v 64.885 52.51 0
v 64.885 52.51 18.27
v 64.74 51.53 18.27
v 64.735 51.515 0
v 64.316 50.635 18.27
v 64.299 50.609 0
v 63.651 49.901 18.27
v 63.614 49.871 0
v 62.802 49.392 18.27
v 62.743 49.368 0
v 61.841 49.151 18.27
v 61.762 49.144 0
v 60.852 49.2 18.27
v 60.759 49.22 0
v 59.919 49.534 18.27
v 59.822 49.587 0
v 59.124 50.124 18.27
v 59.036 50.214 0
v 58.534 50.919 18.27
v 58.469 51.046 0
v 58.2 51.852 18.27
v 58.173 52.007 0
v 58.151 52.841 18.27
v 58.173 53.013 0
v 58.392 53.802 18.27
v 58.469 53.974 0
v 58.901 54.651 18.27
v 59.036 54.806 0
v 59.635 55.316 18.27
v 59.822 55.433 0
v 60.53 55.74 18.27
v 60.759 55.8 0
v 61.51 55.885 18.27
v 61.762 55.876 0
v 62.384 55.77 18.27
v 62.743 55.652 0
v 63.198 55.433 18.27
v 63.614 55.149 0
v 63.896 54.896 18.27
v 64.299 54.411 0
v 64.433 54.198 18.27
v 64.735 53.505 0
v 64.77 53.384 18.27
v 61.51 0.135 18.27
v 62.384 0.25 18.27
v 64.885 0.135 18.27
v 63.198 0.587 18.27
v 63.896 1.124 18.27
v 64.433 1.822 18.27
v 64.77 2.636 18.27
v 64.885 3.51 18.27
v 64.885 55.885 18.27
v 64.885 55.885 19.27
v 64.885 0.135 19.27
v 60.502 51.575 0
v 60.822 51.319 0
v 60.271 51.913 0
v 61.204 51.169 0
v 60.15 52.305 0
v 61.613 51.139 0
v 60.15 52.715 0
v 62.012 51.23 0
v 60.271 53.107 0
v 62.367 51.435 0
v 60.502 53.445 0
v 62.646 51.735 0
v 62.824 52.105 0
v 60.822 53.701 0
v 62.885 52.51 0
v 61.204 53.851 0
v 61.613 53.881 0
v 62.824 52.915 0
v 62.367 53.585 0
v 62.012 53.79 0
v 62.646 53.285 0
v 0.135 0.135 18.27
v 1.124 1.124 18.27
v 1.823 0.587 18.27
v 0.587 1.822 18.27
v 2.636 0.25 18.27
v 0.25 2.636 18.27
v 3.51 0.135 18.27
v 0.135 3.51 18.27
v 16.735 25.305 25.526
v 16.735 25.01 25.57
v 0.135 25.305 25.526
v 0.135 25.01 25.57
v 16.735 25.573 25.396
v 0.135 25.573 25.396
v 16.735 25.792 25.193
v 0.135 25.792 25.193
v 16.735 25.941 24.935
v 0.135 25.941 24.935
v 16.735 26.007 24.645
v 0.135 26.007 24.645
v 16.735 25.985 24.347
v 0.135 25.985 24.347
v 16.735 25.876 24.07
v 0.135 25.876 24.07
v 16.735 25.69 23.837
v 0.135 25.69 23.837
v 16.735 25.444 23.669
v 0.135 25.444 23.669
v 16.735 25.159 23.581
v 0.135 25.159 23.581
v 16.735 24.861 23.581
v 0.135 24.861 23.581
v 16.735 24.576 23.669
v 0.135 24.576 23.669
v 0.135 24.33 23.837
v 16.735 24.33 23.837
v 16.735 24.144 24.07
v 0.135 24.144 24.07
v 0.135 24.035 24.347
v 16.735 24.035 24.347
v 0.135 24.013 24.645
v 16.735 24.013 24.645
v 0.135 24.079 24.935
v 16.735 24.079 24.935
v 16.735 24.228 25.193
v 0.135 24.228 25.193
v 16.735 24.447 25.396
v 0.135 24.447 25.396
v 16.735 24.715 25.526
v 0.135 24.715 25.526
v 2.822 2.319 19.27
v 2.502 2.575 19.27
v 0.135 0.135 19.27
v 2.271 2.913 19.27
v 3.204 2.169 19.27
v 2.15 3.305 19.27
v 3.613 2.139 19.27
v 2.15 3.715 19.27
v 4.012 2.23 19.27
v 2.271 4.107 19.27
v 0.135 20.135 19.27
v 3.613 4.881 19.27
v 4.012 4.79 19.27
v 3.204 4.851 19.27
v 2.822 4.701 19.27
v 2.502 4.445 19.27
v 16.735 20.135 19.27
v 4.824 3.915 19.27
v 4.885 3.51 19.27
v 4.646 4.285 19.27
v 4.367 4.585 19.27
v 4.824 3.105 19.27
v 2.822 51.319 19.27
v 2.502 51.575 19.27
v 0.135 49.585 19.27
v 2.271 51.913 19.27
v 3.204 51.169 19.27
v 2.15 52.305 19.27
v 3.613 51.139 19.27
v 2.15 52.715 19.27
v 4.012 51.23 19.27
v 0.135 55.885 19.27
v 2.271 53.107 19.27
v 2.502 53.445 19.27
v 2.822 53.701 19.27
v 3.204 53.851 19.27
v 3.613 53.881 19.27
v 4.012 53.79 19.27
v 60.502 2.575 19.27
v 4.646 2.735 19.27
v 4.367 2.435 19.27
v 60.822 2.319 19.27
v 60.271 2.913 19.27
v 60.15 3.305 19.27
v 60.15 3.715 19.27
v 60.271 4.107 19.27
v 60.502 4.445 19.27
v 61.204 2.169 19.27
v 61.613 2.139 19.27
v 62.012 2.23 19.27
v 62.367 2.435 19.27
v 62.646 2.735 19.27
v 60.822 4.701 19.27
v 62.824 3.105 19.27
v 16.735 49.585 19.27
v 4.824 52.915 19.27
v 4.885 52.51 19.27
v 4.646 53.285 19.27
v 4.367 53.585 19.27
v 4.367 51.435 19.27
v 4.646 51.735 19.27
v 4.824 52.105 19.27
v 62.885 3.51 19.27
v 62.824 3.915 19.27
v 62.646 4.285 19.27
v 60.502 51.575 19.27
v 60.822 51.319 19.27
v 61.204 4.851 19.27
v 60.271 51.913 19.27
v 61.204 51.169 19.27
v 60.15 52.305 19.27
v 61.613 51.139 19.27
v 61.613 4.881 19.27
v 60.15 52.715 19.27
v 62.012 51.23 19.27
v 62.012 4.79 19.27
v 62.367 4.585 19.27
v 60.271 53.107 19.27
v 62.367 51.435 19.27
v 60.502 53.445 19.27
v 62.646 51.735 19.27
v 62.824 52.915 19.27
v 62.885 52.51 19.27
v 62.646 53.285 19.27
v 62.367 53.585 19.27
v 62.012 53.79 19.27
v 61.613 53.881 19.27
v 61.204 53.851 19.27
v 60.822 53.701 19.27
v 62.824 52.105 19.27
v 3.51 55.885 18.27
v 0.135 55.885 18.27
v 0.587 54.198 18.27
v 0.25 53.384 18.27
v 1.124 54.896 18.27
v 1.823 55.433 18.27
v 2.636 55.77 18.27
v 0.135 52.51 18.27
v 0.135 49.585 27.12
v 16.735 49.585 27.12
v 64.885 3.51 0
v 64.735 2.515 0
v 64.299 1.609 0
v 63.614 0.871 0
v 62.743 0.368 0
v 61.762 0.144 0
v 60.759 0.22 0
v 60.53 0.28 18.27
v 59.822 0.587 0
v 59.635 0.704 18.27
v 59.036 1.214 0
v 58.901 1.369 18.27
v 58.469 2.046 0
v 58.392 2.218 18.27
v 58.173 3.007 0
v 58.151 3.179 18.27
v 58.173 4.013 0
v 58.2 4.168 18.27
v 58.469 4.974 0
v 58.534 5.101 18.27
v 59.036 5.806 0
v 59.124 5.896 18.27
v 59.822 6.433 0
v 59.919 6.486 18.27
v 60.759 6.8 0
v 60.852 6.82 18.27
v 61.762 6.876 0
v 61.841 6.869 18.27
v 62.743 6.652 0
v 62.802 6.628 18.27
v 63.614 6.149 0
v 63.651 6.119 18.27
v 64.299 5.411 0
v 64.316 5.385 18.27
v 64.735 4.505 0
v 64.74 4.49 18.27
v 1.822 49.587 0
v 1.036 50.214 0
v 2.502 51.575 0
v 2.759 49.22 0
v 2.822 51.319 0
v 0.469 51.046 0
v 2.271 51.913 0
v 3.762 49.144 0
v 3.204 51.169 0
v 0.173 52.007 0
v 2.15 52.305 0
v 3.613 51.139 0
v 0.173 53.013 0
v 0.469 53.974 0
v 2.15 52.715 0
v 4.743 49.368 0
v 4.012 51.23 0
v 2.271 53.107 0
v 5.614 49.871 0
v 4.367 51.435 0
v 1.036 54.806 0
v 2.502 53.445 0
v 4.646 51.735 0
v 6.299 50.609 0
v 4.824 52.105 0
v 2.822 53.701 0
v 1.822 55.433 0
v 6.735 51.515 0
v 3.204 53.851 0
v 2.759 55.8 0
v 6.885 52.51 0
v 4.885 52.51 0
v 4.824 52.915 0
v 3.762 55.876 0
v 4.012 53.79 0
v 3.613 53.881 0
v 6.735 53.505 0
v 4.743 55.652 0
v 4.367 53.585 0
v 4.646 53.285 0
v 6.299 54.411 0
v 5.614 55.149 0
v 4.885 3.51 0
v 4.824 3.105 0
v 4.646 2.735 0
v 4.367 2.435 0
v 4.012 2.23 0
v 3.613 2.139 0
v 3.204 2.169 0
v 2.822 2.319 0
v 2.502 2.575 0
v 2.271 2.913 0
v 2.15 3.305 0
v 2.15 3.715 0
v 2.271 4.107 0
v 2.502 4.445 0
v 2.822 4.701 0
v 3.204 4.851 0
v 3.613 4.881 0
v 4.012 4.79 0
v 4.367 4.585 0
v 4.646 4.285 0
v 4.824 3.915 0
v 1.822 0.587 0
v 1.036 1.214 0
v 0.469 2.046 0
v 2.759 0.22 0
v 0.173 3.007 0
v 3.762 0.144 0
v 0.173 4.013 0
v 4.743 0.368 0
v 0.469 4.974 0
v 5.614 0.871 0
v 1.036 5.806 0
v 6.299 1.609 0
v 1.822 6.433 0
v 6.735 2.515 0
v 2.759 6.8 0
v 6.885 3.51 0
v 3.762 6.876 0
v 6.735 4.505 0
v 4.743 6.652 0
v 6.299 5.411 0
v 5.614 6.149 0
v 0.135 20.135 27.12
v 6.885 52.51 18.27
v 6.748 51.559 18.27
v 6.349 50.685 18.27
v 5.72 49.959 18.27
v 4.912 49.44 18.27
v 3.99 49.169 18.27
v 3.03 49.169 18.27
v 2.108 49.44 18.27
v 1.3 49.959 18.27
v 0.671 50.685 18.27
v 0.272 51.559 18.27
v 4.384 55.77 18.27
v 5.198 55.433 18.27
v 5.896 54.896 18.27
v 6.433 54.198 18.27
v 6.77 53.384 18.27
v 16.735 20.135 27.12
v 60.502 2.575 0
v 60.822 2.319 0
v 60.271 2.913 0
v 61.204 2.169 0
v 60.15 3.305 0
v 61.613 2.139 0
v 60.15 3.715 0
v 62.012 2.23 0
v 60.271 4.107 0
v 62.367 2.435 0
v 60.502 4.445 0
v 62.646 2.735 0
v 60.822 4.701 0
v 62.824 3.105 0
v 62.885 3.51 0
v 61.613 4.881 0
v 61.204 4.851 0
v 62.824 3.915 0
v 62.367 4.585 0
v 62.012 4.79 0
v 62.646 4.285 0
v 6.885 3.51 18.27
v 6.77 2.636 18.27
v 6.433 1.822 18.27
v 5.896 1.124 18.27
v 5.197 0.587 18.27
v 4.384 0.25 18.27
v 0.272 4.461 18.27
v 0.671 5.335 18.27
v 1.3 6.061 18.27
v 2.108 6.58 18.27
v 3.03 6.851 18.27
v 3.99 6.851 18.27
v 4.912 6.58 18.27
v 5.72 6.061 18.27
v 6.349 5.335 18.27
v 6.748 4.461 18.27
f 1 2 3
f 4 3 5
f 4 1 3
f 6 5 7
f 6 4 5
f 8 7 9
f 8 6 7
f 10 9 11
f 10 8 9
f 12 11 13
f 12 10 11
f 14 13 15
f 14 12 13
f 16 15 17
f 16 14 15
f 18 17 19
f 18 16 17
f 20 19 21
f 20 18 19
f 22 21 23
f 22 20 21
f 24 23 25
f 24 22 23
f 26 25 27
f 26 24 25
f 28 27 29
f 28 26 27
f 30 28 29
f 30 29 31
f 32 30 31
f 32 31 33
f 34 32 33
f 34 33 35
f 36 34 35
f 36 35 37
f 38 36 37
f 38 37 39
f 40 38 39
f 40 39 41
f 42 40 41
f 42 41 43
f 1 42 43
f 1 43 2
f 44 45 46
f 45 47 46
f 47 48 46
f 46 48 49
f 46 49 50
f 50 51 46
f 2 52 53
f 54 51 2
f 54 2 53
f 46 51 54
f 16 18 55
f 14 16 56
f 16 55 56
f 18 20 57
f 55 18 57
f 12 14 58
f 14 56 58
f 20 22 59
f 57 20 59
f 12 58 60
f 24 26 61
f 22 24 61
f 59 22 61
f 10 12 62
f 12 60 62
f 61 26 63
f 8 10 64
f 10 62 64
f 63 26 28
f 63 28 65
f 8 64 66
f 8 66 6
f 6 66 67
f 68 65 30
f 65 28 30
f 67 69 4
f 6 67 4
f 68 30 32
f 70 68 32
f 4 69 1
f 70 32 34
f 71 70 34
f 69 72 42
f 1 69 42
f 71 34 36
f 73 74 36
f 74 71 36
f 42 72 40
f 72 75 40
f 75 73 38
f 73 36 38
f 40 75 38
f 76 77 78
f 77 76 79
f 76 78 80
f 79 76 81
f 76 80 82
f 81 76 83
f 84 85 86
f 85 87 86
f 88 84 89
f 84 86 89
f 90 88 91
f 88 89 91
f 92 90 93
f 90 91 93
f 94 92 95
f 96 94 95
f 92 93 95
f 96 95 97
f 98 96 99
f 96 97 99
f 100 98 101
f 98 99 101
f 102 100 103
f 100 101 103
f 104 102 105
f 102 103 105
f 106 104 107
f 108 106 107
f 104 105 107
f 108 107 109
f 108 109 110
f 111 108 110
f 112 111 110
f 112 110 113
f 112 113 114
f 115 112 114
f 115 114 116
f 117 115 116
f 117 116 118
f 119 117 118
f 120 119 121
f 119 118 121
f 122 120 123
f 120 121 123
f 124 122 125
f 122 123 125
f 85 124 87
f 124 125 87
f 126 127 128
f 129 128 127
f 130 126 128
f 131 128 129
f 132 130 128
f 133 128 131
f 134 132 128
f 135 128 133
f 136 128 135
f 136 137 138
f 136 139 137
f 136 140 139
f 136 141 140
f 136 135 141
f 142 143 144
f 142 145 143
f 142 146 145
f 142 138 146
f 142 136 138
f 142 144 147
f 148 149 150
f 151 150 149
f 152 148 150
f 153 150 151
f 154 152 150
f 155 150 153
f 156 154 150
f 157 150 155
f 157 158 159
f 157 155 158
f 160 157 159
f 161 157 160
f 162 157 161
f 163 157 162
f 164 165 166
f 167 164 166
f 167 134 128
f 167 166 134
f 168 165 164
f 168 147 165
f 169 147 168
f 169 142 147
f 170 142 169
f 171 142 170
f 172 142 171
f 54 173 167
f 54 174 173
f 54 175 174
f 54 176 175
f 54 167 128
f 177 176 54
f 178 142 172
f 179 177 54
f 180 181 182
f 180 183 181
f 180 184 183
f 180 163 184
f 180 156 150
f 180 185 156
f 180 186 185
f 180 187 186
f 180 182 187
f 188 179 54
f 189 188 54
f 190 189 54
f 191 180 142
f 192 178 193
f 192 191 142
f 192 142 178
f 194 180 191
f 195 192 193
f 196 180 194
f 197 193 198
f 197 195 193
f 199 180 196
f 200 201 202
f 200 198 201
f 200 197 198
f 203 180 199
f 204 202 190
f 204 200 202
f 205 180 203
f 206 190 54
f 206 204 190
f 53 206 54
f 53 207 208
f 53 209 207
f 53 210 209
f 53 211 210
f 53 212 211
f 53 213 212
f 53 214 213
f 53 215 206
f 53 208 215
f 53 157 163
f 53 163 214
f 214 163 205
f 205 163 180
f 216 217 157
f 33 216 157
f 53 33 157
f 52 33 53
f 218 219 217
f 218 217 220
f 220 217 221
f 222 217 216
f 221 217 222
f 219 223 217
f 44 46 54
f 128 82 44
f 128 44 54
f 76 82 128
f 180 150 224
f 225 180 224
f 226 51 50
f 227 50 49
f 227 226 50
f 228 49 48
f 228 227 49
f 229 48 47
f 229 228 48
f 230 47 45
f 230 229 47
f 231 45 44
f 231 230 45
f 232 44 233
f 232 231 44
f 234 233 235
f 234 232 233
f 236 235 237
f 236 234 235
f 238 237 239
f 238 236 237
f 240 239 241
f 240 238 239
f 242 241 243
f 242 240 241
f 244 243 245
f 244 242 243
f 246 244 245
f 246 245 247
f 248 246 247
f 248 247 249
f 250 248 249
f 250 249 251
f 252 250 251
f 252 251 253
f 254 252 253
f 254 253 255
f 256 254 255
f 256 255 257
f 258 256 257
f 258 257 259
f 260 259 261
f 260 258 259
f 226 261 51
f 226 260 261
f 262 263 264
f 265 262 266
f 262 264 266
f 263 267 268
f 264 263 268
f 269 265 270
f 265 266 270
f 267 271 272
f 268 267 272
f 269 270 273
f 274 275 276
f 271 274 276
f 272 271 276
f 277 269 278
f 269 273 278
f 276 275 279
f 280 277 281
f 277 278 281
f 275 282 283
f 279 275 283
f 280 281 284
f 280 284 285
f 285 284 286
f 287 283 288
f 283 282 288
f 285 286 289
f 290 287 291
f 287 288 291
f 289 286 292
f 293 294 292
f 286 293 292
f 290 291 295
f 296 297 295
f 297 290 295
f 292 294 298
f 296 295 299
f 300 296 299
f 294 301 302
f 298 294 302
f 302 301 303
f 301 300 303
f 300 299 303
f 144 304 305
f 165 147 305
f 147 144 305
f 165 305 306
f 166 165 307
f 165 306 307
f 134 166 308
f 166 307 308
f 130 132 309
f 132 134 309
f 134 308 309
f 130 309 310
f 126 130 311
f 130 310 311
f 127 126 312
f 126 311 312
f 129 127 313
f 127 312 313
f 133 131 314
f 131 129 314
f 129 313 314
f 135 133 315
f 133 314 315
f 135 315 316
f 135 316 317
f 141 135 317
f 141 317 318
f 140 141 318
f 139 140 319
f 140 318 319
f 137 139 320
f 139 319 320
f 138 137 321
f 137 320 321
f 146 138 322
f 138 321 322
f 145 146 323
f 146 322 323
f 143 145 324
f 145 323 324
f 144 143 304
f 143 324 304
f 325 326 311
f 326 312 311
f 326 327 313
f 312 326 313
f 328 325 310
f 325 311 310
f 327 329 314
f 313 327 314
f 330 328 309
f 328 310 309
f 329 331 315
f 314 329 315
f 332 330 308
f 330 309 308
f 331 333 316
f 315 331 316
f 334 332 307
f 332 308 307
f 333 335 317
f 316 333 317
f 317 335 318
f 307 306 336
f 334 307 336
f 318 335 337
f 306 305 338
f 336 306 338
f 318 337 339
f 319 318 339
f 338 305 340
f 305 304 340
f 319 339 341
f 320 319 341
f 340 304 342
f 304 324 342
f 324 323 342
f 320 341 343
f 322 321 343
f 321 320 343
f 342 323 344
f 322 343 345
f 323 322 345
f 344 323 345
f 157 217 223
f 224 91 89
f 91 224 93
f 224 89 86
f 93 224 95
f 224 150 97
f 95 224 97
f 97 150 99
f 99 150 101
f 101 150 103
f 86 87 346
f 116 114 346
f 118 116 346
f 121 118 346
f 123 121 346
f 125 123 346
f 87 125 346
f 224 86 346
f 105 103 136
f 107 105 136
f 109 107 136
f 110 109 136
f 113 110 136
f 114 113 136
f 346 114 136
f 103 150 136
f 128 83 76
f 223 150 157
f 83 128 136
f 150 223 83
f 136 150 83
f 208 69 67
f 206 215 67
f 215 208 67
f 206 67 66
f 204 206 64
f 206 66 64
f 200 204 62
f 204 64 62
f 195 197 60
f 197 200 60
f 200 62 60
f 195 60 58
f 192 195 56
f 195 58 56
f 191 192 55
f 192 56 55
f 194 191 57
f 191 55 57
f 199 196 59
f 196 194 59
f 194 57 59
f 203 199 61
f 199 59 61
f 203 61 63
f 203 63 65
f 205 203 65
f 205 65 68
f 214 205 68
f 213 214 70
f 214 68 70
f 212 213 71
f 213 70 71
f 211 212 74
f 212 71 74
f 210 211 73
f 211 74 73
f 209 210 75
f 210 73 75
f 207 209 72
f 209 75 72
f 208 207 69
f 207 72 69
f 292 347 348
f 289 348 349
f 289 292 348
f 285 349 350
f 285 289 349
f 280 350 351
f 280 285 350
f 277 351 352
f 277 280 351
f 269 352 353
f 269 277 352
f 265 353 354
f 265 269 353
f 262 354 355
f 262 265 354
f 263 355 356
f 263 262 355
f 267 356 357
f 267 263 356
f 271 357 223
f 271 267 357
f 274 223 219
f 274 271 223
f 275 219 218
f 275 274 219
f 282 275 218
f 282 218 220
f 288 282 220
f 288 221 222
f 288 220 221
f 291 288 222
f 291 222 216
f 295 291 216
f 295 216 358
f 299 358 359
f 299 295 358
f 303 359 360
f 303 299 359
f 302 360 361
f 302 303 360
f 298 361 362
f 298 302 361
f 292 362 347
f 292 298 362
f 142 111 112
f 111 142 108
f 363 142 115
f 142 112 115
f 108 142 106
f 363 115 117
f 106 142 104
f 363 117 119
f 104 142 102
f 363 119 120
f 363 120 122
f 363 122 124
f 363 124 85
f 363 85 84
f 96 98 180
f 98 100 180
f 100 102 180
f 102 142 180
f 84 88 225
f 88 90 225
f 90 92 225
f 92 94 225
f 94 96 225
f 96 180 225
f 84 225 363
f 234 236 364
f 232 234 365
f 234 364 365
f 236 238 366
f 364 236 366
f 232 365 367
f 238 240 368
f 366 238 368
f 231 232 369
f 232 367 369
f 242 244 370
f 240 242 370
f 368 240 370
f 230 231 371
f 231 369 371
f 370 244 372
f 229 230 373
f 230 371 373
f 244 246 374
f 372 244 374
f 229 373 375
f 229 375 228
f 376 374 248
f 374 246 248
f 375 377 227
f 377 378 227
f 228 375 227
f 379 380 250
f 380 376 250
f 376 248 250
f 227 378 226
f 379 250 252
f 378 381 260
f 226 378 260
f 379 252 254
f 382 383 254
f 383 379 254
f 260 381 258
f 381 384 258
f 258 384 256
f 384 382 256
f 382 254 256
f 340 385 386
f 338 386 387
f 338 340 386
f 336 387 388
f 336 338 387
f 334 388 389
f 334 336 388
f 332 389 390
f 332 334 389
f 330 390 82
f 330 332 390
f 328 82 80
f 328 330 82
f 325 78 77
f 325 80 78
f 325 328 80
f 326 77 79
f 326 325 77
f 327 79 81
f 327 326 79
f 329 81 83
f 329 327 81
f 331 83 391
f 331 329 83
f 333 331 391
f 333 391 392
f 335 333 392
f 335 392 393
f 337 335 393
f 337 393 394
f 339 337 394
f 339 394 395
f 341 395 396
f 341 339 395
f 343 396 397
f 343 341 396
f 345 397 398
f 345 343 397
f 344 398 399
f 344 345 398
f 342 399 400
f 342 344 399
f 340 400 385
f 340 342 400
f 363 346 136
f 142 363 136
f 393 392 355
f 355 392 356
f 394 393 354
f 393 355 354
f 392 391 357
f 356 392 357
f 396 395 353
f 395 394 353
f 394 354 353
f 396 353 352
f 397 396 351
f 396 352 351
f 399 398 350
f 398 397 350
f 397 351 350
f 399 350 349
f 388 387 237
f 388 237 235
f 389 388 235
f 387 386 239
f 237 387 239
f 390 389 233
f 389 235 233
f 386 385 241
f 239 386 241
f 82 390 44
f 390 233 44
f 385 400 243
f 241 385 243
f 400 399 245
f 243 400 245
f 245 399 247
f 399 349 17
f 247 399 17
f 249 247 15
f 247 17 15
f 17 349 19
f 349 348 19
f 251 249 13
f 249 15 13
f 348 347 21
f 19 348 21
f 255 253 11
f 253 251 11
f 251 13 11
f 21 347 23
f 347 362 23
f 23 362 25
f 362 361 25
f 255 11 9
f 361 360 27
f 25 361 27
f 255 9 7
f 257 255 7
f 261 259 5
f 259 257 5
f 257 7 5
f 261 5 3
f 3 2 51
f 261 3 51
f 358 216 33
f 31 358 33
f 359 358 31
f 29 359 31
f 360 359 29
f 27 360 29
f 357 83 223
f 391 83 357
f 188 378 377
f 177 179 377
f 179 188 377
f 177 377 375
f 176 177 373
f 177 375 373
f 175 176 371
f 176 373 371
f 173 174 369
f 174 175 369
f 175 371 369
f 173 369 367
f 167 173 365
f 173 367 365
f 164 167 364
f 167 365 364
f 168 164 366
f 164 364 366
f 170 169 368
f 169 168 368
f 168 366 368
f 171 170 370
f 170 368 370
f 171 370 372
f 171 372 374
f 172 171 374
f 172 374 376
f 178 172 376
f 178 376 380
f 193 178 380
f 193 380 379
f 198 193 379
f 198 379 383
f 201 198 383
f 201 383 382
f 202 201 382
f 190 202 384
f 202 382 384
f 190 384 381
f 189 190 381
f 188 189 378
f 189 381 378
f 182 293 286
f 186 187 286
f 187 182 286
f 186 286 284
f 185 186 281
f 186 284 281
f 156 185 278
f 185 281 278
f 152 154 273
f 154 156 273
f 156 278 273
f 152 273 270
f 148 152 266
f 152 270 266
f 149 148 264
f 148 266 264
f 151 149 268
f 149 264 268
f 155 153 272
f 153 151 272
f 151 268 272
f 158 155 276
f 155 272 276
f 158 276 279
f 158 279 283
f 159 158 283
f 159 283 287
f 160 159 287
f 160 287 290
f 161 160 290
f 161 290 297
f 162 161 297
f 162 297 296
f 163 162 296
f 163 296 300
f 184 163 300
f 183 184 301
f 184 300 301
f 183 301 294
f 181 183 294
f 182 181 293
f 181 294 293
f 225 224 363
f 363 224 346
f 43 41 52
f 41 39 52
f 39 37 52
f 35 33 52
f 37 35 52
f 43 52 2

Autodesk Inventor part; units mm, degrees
ref_plane "YZ Plane" through (0, 0, 0) normal (1, 0, 0) x (0, 1, 0)
ref_plane "XZ Plane" through (0, 0, 0) normal (0, 1, 0) x (-1, 0, 0)
ref_plane "XY Plane" through (0, 0, 0) normal (0, 0, 1) x (1, 0, 0)
ref_plane "Work Plane1" through (0, 0, 0) normal (0, 0, 1) x (1, 0, 0)
sketch "Sketch1" plane through (0, 0, 0) normal (0, 0, 1) x (1, 0, 0)
  circle A0 centre (3.51, 3.51) radius 1.375 projected
  circle A1 centre (3.51, 52.51) radius 1.375 projected
  circle A2 centre (61.51, 3.51) radius 1.375 projected
  circle A3 centre (61.51, 52.51) radius 1.375 projected
  arc A4 (81.9342, 0.01) -> (84.9342, 3.01) centre (81.9342, 3.01) ccw projected
  line L0 (84.9342, 53.01) -> (84.9342, 3.01) projected
  arc A5 (84.9342, 53.01) -> (81.9342, 56.01) centre (81.9342, 53.01) ccw projected
  line L1 (3.01, 56.01) -> (81.9342, 56.01) projected
  arc A6 (3.01, 56.01) -> (0.01, 53.01) centre (3.01, 53.01) ccw projected
  line L2 (0.01, 3.01) -> (0.01, 53.01) projected
  arc A7 (0.01, 3.01) -> (3.01, 0.01) centre (3.01, 3.01) ccw projected
  line L3 (81.9342, 0.01) -> (3.01, 0.01) projected
  circle A8 centre (62.7211, 47.7874) radius 0.5 projected
  circle A9 centre (60.1799, 47.7874) radius 0.5 projected
  circle A10 centre (17.8493, 49.9216) radius 0.2 projected
  circle A11 centre (36.5812, 39.2893) radius 0.2 projected
  circle A12 centre (37.5476, 38.3302) radius 0.2 projected
  circle A13 centre (39.0559, 38.3448) radius 0.2 projected
  circle A14 centre (40.0809, 38.3448) radius 0.2 projected
  circle A15 centre (38.7337, 39.7432) radius 0.2 projected
  circle A16 centre (39.356, 39.8091) radius 0.2 projected
  circle A17 centre (40.0296, 39.8164) radius 0.2 projected
  circle A18 centre (40.652, 39.6993) radius 0.2 projected
  circle A19 centre (41.0117, 20.1437) radius 0.2 projected
  circle A20 centre (41.1526, 21.0771) radius 0.2 projected
  circle A21 centre (40.2016, 21.3941) radius 0.2 projected
  circle A22 centre (38.7222, 22.8029) radius 0.2 projected
  circle A23 centre (41.452, 24.5993) radius 0.2 projected
  circle A24 centre (46.094, 34.1738) radius 0.2 projected
  circle A25 centre (46.11, 35.2296) radius 0.2 projected
  circle A26 centre (48.0215, 37.8609) radius 0.2 projected
  circle A27 centre (47.3576, 38.0529) radius 0.2 projected
  circle A28 centre (47.9175, 36.9172) radius 0.2 projected
  circle A29 centre (46.8138, 36.0454) radius 0.2 projected
  line L4 (46.452, 40.0993) -> (47.1053, 40.0993) projected
  line L5 (47.1053, 39.6568) -> (47.1053, 40.0993) projected
  line L6 (47.1053, 39.6568) -> (46.452, 39.6568) projected
  line L7 (46.452, 40.0993) -> (46.452, 39.6568) projected
  line L8 (46.4251, 39.252) -> (47.1215, 39.252) projected
  line L9 (47.1215, 38.669) -> (47.1215, 39.252) projected
  line L10 (47.1215, 38.669) -> (46.4251, 38.669) projected
  line L11 (46.4251, 39.252) -> (46.4251, 38.669) projected
  circle A30 centre (12.8532, 47.0439) radius 0.2 projected
  circle A31 centre (5.3847, 46.2615) radius 0.2 projected
  circle A32 centre (5.029, 47.2573) radius 0.2 projected
  circle A33 centre (7.2696, 46.5104) radius 0.2 projected
  circle A34 centre (5.1535, 44.6611) radius 0.2 projected
  circle A35 centre (5.5447, 43.203) radius 0.2 projected
  circle A36 centre (5.7581, 42.4739) radius 0.2 projected
  circle A37 centre (14.0851, 44.6759) radius 0.2 projected
  circle A38 centre (14.166, 45.5261) radius 0.2 projected
  circle A39 centre (13.0628, 44.5342) radius 0.2 projected
  circle A40 centre (37.5714, 47.3662) radius 0.2 projected
  circle A41 centre (17.0041, 47.6564) radius 0.2 projected
  circle A42 centre (16.08, 48.5805) radius 0.2 projected
  circle A43 centre (20.2948, 49.6511) radius 0.2 projected
  circle A44 centre (19.8102, 47.3409) radius 0.2 projected
  circle A45 centre (17.7479, 46.9239) radius 0.2 projected
  circle A46 centre (18.3339, 46.2027) radius 0.2 projected
  circle A47 centre (18.1649, 45.4138) radius 0.2 projected
  circle A48 centre (18.1311, 44.7489) radius 0.2 projected
  circle A49 centre (19.3482, 45.0419) radius 0.2 projected
  circle A50 centre (22.5712, 45.549) radius 0.2 projected
  circle A51 centre (22.4585, 43.2275) radius 0.2 projected
  circle A52 centre (20.2159, 42.1457) radius 0.2 projected
  circle A53 centre (21.0611, 42.1457) radius 0.2 projected
  circle A54 centre (22.9995, 39.7903) radius 0.2 projected
  circle A55 centre (24.9716, 40.7032) radius 0.2 projected
  circle A56 centre (24.1377, 41.8527) radius 0.2 projected
  circle A57 centre (26.2225, 45.0081) radius 0.2 projected
  circle A58 centre (28.7244, 47.7917) radius 0.2 projected
  circle A59 centre (29.7799, 44.7027) radius 0.2 projected
  circle A60 centre (26.4936, 42.0617) radius 0.2 projected
  circle A61 centre (27.2653, 42.0617) radius 0.2 projected
  circle A62 centre (28.1501, 41.7889) radius 0.2 projected
  circle A63 centre (28.5891, 44.6362) radius 0.2 projected
  circle A64 centre (41.8541, 33.8303) radius 0.2 projected
  circle A65 centre (39.0881, 33.1764) radius 0.2 projected
  circle A66 centre (39.2384, 32.3947) radius 0.2 projected
  circle A67 centre (37.5172, 32.7555) radius 0.2 projected
  circle A68 centre (37.5548, 31.1696) radius 0.2 projected
  circle A69 centre (37.1489, 32.2143) radius 0.2 projected
  circle A70 centre (38.9002, 30.9591) radius 0.2 projected
  circle A71 centre (47.0528, 27.6624) radius 0.2 projected
  circle A72 centre (46.4175, 27.734) radius 0.2 projected
  circle A73 centre (45.7286, 27.6892) radius 0.2 projected
  circle A74 centre (46.8112, 29.1834) radius 0.2 projected
  circle A75 centre (45.9523, 29.1834) radius 0.2 projected
  circle A76 centre (45.8002, 30.6954) radius 0.2 projected
  circle A77 centre (39.8415, 32.4043) radius 0.2 projected
  circle A78 centre (45.1292, 30.6954) radius 0.2 projected
  circle A79 centre (44.6281, 30.1407) radius 0.2 projected
  circle A80 centre (11.6818, 11.7476) radius 0.2 projected
  circle A81 centre (9.0575, 7.6392) radius 0.2 projected
  circle A82 centre (10.5992, 8.0511) radius 0.2 projected
  circle A83 centre (9.3108, 11.4405) radius 0.2 projected
  circle A84 centre (24.4942, 19.3962) radius 0.2 projected
  circle A85 centre (23.8972, 20.7096) radius 0.2 projected
  circle A86 centre (23.7266, 21.6478) radius 0.2 projected
  circle A87 centre (20.298, 18.9527) radius 0.2 projected
  circle A88 centre (19.6328, 19.9762) radius 0.2 projected
  circle A89 centre (20.2639, 22.6201) radius 0.2 projected
  circle A90 centre (21.2191, 16.0359) radius 0.2 projected
  circle A91 centre (19.7863, 17.0082) radius 0.2 projected
  circle A92 centre (16.0388, 20.435) radius 0.2 projected
  circle A93 centre (15.5322, 21.0917) radius 0.2 projected
  circle A94 centre (15.0443, 19.9472) radius 0.2 projected
  circle A95 centre (12.8303, 17.8457) radius 0.2 projected
  circle A96 centre (12.9991, 14.1306) radius 0.2 projected
  circle A97 centre (12.8115, 21.2981) radius 0.2 projected
  circle A98 centre (10.8789, 20.754) radius 0.2 projected
  circle A99 centre (9.8657, 21.0542) radius 0.2 projected
  circle A100 centre (7.4264, 20.8478) radius 0.2 projected
  circle A101 centre (15.9825, 23.3996) radius 0.2 projected
  circle A102 centre (18.2528, 25.1446) radius 0.2 projected
  circle A103 centre (18.0464, 26.3642) radius 0.2 projected
  circle A104 centre (40.4141, 32.3685) radius 0.2 projected
  circle A105 centre (39.8773, 31.1696) radius 0.2 projected
  circle A106 centre (40.4499, 31.1875) radius 0.2 projected
  circle A107 centre (41.0404, 31.1964) radius 0.2 projected
  circle A108 centre (42.5704, 29.7112) radius 0.2 projected
  circle A109 centre (41.2194, 29.7381) radius 0.2 projected
  circle A110 centre (40.2263, 29.7381) radius 0.2 projected
  circle A111 centre (40.7362, 29.2907) radius 0.2 projected
  circle A112 centre (40.1636, 29.1655) radius 0.2 projected
  circle A113 centre (43.3487, 27.7698) radius 0.2 projected
  circle A114 centre (41.9799, 27.7966) radius 0.2 projected
  circle A115 centre (40.6647, 27.6982) radius 0.2 projected
  circle A116 centre (39.9579, 27.5908) radius 0.2 projected
  circle A117 centre (39.5373, 29.3444) radius 0.2 projected
  circle A118 centre (38.92, 29.2549) radius 0.2 projected
  circle A119 centre (37.2827, 29.6218) radius 0.2 projected
  circle A120 centre (36.0749, 28.4139) radius 0.2 projected
  circle A121 centre (29.1907, 24.3381) radius 0.2 projected
  circle A122 centre (27.6996, 24.2884) radius 0.2 projected
  circle A123 centre (28.4949, 23.0706) radius 0.2 projected
  circle A124 centre (14.427, 28.8264) radius 0.2 projected
  circle A125 centre (2.9207, 47.9664) radius 0.2 projected
  circle A126 centre (7.0703, 48.4466) radius 0.2 projected
  circle A127 centre (7.5505, 49.3039) radius 0.2 projected
  circle A128 centre (15.1467, 49.7326) radius 0.2 projected
  circle A129 centre (14.0493, 49.3897) radius 0.2 projected
  circle A130 centre (14.658, 47.5806) radius 0.2 projected
  circle A131 centre (12.3002, 49.4497) radius 0.2 projected
  circle A132 centre (7.7168, 40.9892) radius 0.2 projected
  circle A133 centre (10.4087, 42.9755) radius 0.2 projected
  circle A134 centre (10.2127, 42.4005) radius 0.2 projected
  circle A135 centre (10.6701, 41.9039) radius 0.2 projected
  circle A136 centre (10.1082, 41.3159) radius 0.2 projected
  circle A137 centre (13.9239, 42.1391) radius 0.2 projected
  circle A138 centre (14.0284, 41.4073) radius 0.2 projected
  circle A139 centre (12.0552, 41.2244) radius 0.2 projected
  circle A140 centre (12.6433, 40.8454) radius 0.2 projected
  circle A141 centre (8.5139, 32.5345) radius 0.2 projected
  circle A142 centre (8.2918, 33.0964) radius 0.2 projected
  circle A143 centre (12.8001, 34.4554) radius 0.2 projected
  circle A144 centre (13.5972, 34.4162) radius 0.2 projected
  circle A145 centre (9.5201, 36.5593) radius 0.2 projected
  circle A146 centre (7.5992, 37.0167) radius 0.2 projected
  circle A147 centre (11.8723, 39.2904) radius 0.2 projected
  circle A148 centre (12.7609, 39.8262) radius 0.2 projected
  circle A149 centre (14.1591, 39.8784) radius 0.2 projected
  circle A150 centre (14.146, 38.9376) radius 0.2 projected
  circle A151 centre (13.1784, 11.4642) radius 0.2 projected
  circle A152 centre (18.3991, 11.0833) radius 0.2 projected
  circle A153 centre (19.0937, 10.792) radius 0.2 projected
  circle A154 centre (20.819, 12.8086) radius 0.2 projected
  circle A155 centre (17.7493, 13.6152) radius 0.2 projected
  circle A156 centre (16.6962, 13.5928) radius 0.2 projected
  circle A157 centre (3.9784, 11.7596) radius 0.2 projected
  circle A158 centre (4.865, 11.9936) radius 0.2 projected
  circle A159 centre (1.0352, 16.5993) radius 0.2 projected
  circle A160 centre (0.9613, 17.3874) radius 0.2 projected
  circle A161 centre (1.0967, 19.5917) radius 0.2 projected
  circle A162 centre (6.3428, 16.5008) radius 0.2 projected
  circle A163 centre (6.3551, 17.8923) radius 0.2 projected
  circle A164 centre (7.1076, 30.2668) radius 0.2 projected
  circle A165 centre (7.0255, 27.339) radius 0.2 projected
  circle A166 centre (7.0392, 24.3017) radius 0.2 projected
  circle A167 centre (10.8426, 27.3527) radius 0.2 projected
  circle A168 centre (7.2488, 32.9091) radius 0.2 projected
  circle A169 centre (9.1368, 34.4688) radius 0.2 projected
  circle A170 centre (14.1852, 37.9575) radius 0.2 projected
  circle A171 centre (14.0758, 37.0956) radius 0.2 projected
  circle A172 centre (14.1579, 36.4799) radius 0.2 projected
  circle A173 centre (18.4675, 36.261) radius 0.2 projected
  circle A174 centre (19.2676, 35.2967) radius 0.2 projected
  circle A175 centre (13.3428, 33.2614) radius 0.2 projected
  circle A176 centre (13.4898, 32.4473) radius 0.2 projected
  circle A177 centre (12.6898, 32.1644) radius 0.2 projected
  circle A178 centre (11.4913, 31.1129) radius 0.2 projected
  circle A179 centre (16.4974, 28.75) radius 0.2 projected
  circle A180 centre (11.6806, 26.3755) radius 0.2 projected
  circle A181 centre (11.8276, 27.3253) radius 0.2 projected
  circle A182 centre (13.8092, 30.8641) radius 0.2 projected
  circle A183 centre (13.7407, 30.1903) radius 0.2 projected
  circle A184 centre (13.6493, 28.7855) radius 0.2 projected
  circle A185 centre (13.7635, 26.5013) radius 0.2 projected
  circle A186 centre (13.7064, 27.3236) radius 0.2 projected
  circle A187 centre (18.0693, 28.8654) radius 0.2 projected
  circle A188 centre (18.2749, 27.1865) radius 0.2 projected
  circle A189 centre (18.4233, 25.7475) radius 0.2 projected
  circle A190 centre (42.354, 45.4661) radius 0.2 projected
  circle A191 centre (43.2414, 45.549) radius 0.2 projected
  circle A192 centre (44.1537, 45.5573) radius 0.2 projected
  circle A193 centre (40.3139, 42.522) radius 0.2 projected
  circle A194 centre (42.8516, 41.6098) radius 0.2 projected
  circle A195 centre (39.4431, 43.6167) radius 0.2 projected
  circle A196 centre (40.3968, 43.5835) radius 0.2 projected
  circle A197 centre (41.5081, 43.6001) radius 0.2 projected
  circle A198 centre (84.1123, 38.0141) radius 0.2 projected
  circle A199 centre (79.6259, 38.2091) radius 0.2 projected
  circle A200 centre (48.1699, 12.8899) radius 0.2 projected
  circle A201 centre (65.0598, 17.0332) radius 0.2 projected
  circle A202 centre (64.2609, 17.846) radius 0.2 projected
  circle A203 centre (68.3812, 24.4748) radius 0.2 projected
  circle A204 centre (68.2971, 22.3026) radius 0.2 projected
  circle A205 centre (67.4983, 20.5227) radius 0.2 projected
  circle A206 centre (64.4571, 24.9933) radius 0.2 projected
  circle A207 centre (63.364, 22.1204) radius 0.2 projected
  circle A208 centre (53.5119, 27.0534) radius 0.2 projected
  circle A209 centre (55.3618, 26.0164) radius 0.2 projected
  circle A210 centre (56.1186, 28.6511) radius 0.2 projected
  circle A211 centre (57.0435, 28.609) radius 0.2 projected
  circle A212 centre (58.5431, 28.4549) radius 0.2 projected
  circle A213 centre (60.0706, 28.525) radius 0.2 projected
  circle A214 centre (60.7777, 25.9208) radius 0.2 projected
  circle A215 centre (61.0198, 26.5324) radius 0.2 projected
  circle A216 centre (62.0645, 25.8953) radius 0.2 projected
  circle A217 centre (61.7333, 26.4559) radius 0.2 projected
  circle A218 centre (61.7842, 28.5199) radius 0.2 projected
  circle A219 centre (62.6123, 28.5199) radius 0.2 projected
  circle A220 centre (63.6443, 28.609) radius 0.2 projected
  circle A221 centre (64.4229, 28.4392) radius 0.2 projected
  circle A222 centre (65.1448, 32.1056) radius 0.2 projected
  circle A223 centre (65.1732, 34.6395) radius 0.2 projected
  circle A224 centre (65.4563, 35.2765) radius 0.2 projected
  circle A225 centre (65.1448, 37.2159) radius 0.2 projected
  circle A226 centre (64.9891, 38.1502) radius 0.2 projected
  circle A227 centre (63.6585, 39.2402) radius 0.2 projected
  circle A228 centre (62.5543, 40.4151) radius 0.2 projected
  circle A229 centre (60.2327, 40.3868) radius 0.2 projected
  circle A230 centre (55.0516, 40.2452) radius 0.2 projected
  circle A231 centre (49.2898, 45.5976) radius 0.2 projected
  circle A232 centre (47.7592, 43.8525) radius 0.2 projected
  circle A233 centre (45.1074, 43.3845) radius 0.2 projected
  circle A234 centre (47.6032, 41.8636) radius 0.2 projected
  circle A235 centre (47.8469, 41.1909) radius 0.2 projected
  circle A236 centre (46.5503, 40.7327) radius 0.2 projected
  circle A237 centre (45.9653, 40.1088) radius 0.2 projected
  circle A238 centre (44.2982, 39.7578) radius 0.2 projected
  circle A239 centre (43.6547, 39.709) radius 0.2 projected
  circle A240 centre (45.162, 36.0312) radius 0.2 projected
  circle A241 centre (43.4561, 36.6901) radius 0.2 projected
  circle A242 centre (42.702, 36.0385) radius 0.2 projected
  circle A243 centre (37.7966, 35.2917) radius 0.2 projected
  circle A244 centre (40.0589, 34.684) radius 0.2 projected
  circle A245 centre (39.195, 35.1892) radius 0.2 projected
  circle A246 centre (40.1102, 35.2551) radius 0.2 projected
  circle A247 centre (38.8875, 36.2069) radius 0.2 projected
  circle A248 centre (39.4952, 36.3899) radius 0.2 projected
  circle A249 centre (40.4762, 36.324) radius 0.2 projected
  circle A250 centre (40.1687, 36.8658) radius 0.2 projected
  circle A251 centre (40.8863, 36.9683) radius 0.2 projected
  circle A252 centre (42.5702, 37.986) radius 0.2 projected
  circle A253 centre (40.3225, 37.4589) radius 0.2 projected
  circle A254 centre (37.5989, 36.756) radius 0.2 projected
  circle A255 centre (42.5556, 37.166) radius 0.2 projected
  circle A256 centre (39.0485, 37.5101) radius 0.2 projected
  circle A257 centre (11.5458, 48.2837) radius 0.2 projected
  circle A258 centre (11.6829, 47.1262) radius 0.2 projected
  circle A259 centre (12.1519, 45.2427) radius 0.2 projected
  circle A260 centre (12.1872, 44.2312) radius 0.2 projected
  circle A261 centre (11.2111, 44.243) radius 0.2 projected
  circle A262 centre (8.365, 45.4544) radius 0.2 projected
  circle A263 centre (8.4002, 44.8663) radius 0.2 projected
  circle A264 centre (8.2238, 43.8431) radius 0.2 projected
  circle A265 centre (5.9893, 41.6203) radius 0.2 projected
  circle A266 centre (11.9376, 38.0098) radius 0.2 projected
  circle A267 centre (11.6632, 36.4155) radius 0.2 projected
  circle A268 centre (6.789, 41.8908) radius 0.2 projected
  circle A269 centre (7.4947, 41.9039) radius 0.2 projected
  circle A270 centre (6.5277, 40.179) radius 0.2 projected
  circle A271 centre (6.5669, 39.3688) radius 0.2 projected
  circle A272 centre (7.0373, 38.5586) radius 0.2 projected
  circle A273 centre (7.7037, 39.3035) radius 0.2 projected
  circle A274 centre (8.723, 40.4926) radius 0.2 projected
  circle A275 centre (8.344, 39.5779) radius 0.2 projected
  circle A276 centre (7.8736, 40.2182) radius 0.2 projected
  circle A277 centre (29.1549, 13.7915) radius 0.2 projected
  circle A278 centre (27.3819, 14.6837) radius 0.2 projected
  circle A279 centre (29.0062, 15.6674) radius 0.2 projected
  circle A280 centre (29.0977, 14.5922) radius 0.2 projected
  circle A281 centre (29.052, 12.8993) radius 0.2 projected
  circle A282 centre (26.1923, 13.883) radius 0.2 projected
  circle A283 centre (25.5517, 17.4176) radius 0.2 projected
  circle A284 centre (19.1306, 7.859) radius 0.2 projected
  circle A285 centre (22.4633, 13.0937) radius 0.2 projected
  circle A286 centre (22.052, 4.6993) radius 0.2 projected
  circle A287 centre (23.0683, 2.2713) radius 0.2 projected
  circle A288 centre (22.9648, 1.2738) radius 0.2 projected
  circle A289 centre (20.7156, 1.2832) radius 0.2 projected
  circle A290 centre (18.9182, 1.2173) radius 0.2 projected
  circle A291 centre (20.5745, 4.8781) radius 0.2 projected
  circle A292 centre (17.0737, 4.0311) radius 0.2 projected
  circle A293 centre (20.1698, 6.2332) radius 0.2 projected
  circle A294 centre (16.2361, 4.1911) radius 0.2 projected
  circle A295 centre (9.7989, 7.2391) radius 0.2 projected
  circle A296 centre (3.51, 52.51) radius 1.375 projected
  circle A297 centre (3.51, 3.51) radius 1.375 projected
  circle A298 centre (61.51, 3.51) radius 1.375 projected
  circle A299 centre (61.51, 52.51) radius 1.375 projected
  circle A300 centre (9.2652, 49.8784) radius 0.2 projected
  circle A301 centre (3.51, 52.51) radius 3.375
  circle A302 centre (3.51, 3.51) radius 3.375
  circle A303 centre (61.51, 52.51) radius 3.375
  circle A304 centre (61.51, 3.51) radius 3.375
  point P0 (0, 0)
  dimension "d0" = 2
  dimension "d1" = 2
  dimension "d2" = 2
  dimension "d3" = 2
extrude "Extrusion1" add sketch "Sketch1" along normal blind 18.27 contours A301 | A302 | A303 | A304
sketch "Sketch2" plane through (3.51, 52.51, 18.27) normal (0, 0, 1) x (1, 0, 0)
  circle A0 centre (0, 0) radius 1.375 projected
  circle A1 centre (0, 0) radius 3.375 projected
  circle A2 centre (0, -49) radius 1.375 projected
  circle A3 centre (0, -49) radius 3.375 projected
  circle A4 centre (58, -49) radius 1.375 projected
  circle A5 centre (58, -49) radius 1.375 projected
  circle A6 centre (58, -49) radius 3.375 projected
  circle A7 centre (58, 0) radius 1.375 projected
  circle A8 centre (58, 0) radius 3.375 projected
  line L0 (-3.375, 0) -> (-3.375, -49)
  line L1 (0, 3.375) -> (58, 3.375)
  circle A9 centre (58, 0) radius 3.375 projected
  line L2 (61.375, 0) -> (61.375, -49)
  line L3 (58, -52.375) -> (0, -52.375)
  line L4 (-3.375, 3.375) -> (61.375, 3.375)
  line L5 (61.375, 3.375) -> (61.375, -52.375)
  line L6 (61.375, -52.375) -> (-3.375, -52.375)
  line L7 (-3.375, -52.375) -> (-3.375, 3.375)
  point P0 (-3.51, -52.51)
extrude "Extrusion2" add sketch "Sketch2" along normal blind 1
sketch "Sketch3" plane through (0.135, 3.51, 18.27) normal (-1, 0, 0) x (0, 0, 1)
  line L0 (1, 52.375) -> (1, -3.375) projected
  line L1 (0, -3.375) -> (0, 0) projected
  line L2 (0, -3.375) -> (1, -3.375) projected
  line L3 (1, 52.375) -> (1, -3.375) projected
  line L4 (0, 52.375) -> (1, 52.375) projected
  line L5 (0, 49) -> (0, 52.375) projected
  line L6 (0, 0) -> (0, 49) projected
  line L7 (1, 46.075) -> (8.85, 46.075)
  line L8 (8.85, 46.075) -> (8.85, 16.625)
  line L9 (8.85, 16.625) -> (1, 16.625)
  line L10 (1, 16.625) -> (1, 46.075)
  line L11 (-19.6, 49.5) -> (-19.6, -0.5) projected
  circle A0 centre (6.3, 21.5) radius 1
  line L12 (-19.6, 52.5) -> (-18.27, 52.5) projected
  point P0 (-18.27, -3.51)
  dimension "d8" = 6.3
  dimension "d9" = 20
  dimension "d10" = 28.45
  dimension "d11" = 2
  dimension "d12" = 25.9
  dimension "d13" = 31
extrude "Extrusion3" add sketch "Sketch3" against normal blind 16.6 contours L7 L8 L9 L0
properties part number "00_Anybeam_Nebra_HAT"
